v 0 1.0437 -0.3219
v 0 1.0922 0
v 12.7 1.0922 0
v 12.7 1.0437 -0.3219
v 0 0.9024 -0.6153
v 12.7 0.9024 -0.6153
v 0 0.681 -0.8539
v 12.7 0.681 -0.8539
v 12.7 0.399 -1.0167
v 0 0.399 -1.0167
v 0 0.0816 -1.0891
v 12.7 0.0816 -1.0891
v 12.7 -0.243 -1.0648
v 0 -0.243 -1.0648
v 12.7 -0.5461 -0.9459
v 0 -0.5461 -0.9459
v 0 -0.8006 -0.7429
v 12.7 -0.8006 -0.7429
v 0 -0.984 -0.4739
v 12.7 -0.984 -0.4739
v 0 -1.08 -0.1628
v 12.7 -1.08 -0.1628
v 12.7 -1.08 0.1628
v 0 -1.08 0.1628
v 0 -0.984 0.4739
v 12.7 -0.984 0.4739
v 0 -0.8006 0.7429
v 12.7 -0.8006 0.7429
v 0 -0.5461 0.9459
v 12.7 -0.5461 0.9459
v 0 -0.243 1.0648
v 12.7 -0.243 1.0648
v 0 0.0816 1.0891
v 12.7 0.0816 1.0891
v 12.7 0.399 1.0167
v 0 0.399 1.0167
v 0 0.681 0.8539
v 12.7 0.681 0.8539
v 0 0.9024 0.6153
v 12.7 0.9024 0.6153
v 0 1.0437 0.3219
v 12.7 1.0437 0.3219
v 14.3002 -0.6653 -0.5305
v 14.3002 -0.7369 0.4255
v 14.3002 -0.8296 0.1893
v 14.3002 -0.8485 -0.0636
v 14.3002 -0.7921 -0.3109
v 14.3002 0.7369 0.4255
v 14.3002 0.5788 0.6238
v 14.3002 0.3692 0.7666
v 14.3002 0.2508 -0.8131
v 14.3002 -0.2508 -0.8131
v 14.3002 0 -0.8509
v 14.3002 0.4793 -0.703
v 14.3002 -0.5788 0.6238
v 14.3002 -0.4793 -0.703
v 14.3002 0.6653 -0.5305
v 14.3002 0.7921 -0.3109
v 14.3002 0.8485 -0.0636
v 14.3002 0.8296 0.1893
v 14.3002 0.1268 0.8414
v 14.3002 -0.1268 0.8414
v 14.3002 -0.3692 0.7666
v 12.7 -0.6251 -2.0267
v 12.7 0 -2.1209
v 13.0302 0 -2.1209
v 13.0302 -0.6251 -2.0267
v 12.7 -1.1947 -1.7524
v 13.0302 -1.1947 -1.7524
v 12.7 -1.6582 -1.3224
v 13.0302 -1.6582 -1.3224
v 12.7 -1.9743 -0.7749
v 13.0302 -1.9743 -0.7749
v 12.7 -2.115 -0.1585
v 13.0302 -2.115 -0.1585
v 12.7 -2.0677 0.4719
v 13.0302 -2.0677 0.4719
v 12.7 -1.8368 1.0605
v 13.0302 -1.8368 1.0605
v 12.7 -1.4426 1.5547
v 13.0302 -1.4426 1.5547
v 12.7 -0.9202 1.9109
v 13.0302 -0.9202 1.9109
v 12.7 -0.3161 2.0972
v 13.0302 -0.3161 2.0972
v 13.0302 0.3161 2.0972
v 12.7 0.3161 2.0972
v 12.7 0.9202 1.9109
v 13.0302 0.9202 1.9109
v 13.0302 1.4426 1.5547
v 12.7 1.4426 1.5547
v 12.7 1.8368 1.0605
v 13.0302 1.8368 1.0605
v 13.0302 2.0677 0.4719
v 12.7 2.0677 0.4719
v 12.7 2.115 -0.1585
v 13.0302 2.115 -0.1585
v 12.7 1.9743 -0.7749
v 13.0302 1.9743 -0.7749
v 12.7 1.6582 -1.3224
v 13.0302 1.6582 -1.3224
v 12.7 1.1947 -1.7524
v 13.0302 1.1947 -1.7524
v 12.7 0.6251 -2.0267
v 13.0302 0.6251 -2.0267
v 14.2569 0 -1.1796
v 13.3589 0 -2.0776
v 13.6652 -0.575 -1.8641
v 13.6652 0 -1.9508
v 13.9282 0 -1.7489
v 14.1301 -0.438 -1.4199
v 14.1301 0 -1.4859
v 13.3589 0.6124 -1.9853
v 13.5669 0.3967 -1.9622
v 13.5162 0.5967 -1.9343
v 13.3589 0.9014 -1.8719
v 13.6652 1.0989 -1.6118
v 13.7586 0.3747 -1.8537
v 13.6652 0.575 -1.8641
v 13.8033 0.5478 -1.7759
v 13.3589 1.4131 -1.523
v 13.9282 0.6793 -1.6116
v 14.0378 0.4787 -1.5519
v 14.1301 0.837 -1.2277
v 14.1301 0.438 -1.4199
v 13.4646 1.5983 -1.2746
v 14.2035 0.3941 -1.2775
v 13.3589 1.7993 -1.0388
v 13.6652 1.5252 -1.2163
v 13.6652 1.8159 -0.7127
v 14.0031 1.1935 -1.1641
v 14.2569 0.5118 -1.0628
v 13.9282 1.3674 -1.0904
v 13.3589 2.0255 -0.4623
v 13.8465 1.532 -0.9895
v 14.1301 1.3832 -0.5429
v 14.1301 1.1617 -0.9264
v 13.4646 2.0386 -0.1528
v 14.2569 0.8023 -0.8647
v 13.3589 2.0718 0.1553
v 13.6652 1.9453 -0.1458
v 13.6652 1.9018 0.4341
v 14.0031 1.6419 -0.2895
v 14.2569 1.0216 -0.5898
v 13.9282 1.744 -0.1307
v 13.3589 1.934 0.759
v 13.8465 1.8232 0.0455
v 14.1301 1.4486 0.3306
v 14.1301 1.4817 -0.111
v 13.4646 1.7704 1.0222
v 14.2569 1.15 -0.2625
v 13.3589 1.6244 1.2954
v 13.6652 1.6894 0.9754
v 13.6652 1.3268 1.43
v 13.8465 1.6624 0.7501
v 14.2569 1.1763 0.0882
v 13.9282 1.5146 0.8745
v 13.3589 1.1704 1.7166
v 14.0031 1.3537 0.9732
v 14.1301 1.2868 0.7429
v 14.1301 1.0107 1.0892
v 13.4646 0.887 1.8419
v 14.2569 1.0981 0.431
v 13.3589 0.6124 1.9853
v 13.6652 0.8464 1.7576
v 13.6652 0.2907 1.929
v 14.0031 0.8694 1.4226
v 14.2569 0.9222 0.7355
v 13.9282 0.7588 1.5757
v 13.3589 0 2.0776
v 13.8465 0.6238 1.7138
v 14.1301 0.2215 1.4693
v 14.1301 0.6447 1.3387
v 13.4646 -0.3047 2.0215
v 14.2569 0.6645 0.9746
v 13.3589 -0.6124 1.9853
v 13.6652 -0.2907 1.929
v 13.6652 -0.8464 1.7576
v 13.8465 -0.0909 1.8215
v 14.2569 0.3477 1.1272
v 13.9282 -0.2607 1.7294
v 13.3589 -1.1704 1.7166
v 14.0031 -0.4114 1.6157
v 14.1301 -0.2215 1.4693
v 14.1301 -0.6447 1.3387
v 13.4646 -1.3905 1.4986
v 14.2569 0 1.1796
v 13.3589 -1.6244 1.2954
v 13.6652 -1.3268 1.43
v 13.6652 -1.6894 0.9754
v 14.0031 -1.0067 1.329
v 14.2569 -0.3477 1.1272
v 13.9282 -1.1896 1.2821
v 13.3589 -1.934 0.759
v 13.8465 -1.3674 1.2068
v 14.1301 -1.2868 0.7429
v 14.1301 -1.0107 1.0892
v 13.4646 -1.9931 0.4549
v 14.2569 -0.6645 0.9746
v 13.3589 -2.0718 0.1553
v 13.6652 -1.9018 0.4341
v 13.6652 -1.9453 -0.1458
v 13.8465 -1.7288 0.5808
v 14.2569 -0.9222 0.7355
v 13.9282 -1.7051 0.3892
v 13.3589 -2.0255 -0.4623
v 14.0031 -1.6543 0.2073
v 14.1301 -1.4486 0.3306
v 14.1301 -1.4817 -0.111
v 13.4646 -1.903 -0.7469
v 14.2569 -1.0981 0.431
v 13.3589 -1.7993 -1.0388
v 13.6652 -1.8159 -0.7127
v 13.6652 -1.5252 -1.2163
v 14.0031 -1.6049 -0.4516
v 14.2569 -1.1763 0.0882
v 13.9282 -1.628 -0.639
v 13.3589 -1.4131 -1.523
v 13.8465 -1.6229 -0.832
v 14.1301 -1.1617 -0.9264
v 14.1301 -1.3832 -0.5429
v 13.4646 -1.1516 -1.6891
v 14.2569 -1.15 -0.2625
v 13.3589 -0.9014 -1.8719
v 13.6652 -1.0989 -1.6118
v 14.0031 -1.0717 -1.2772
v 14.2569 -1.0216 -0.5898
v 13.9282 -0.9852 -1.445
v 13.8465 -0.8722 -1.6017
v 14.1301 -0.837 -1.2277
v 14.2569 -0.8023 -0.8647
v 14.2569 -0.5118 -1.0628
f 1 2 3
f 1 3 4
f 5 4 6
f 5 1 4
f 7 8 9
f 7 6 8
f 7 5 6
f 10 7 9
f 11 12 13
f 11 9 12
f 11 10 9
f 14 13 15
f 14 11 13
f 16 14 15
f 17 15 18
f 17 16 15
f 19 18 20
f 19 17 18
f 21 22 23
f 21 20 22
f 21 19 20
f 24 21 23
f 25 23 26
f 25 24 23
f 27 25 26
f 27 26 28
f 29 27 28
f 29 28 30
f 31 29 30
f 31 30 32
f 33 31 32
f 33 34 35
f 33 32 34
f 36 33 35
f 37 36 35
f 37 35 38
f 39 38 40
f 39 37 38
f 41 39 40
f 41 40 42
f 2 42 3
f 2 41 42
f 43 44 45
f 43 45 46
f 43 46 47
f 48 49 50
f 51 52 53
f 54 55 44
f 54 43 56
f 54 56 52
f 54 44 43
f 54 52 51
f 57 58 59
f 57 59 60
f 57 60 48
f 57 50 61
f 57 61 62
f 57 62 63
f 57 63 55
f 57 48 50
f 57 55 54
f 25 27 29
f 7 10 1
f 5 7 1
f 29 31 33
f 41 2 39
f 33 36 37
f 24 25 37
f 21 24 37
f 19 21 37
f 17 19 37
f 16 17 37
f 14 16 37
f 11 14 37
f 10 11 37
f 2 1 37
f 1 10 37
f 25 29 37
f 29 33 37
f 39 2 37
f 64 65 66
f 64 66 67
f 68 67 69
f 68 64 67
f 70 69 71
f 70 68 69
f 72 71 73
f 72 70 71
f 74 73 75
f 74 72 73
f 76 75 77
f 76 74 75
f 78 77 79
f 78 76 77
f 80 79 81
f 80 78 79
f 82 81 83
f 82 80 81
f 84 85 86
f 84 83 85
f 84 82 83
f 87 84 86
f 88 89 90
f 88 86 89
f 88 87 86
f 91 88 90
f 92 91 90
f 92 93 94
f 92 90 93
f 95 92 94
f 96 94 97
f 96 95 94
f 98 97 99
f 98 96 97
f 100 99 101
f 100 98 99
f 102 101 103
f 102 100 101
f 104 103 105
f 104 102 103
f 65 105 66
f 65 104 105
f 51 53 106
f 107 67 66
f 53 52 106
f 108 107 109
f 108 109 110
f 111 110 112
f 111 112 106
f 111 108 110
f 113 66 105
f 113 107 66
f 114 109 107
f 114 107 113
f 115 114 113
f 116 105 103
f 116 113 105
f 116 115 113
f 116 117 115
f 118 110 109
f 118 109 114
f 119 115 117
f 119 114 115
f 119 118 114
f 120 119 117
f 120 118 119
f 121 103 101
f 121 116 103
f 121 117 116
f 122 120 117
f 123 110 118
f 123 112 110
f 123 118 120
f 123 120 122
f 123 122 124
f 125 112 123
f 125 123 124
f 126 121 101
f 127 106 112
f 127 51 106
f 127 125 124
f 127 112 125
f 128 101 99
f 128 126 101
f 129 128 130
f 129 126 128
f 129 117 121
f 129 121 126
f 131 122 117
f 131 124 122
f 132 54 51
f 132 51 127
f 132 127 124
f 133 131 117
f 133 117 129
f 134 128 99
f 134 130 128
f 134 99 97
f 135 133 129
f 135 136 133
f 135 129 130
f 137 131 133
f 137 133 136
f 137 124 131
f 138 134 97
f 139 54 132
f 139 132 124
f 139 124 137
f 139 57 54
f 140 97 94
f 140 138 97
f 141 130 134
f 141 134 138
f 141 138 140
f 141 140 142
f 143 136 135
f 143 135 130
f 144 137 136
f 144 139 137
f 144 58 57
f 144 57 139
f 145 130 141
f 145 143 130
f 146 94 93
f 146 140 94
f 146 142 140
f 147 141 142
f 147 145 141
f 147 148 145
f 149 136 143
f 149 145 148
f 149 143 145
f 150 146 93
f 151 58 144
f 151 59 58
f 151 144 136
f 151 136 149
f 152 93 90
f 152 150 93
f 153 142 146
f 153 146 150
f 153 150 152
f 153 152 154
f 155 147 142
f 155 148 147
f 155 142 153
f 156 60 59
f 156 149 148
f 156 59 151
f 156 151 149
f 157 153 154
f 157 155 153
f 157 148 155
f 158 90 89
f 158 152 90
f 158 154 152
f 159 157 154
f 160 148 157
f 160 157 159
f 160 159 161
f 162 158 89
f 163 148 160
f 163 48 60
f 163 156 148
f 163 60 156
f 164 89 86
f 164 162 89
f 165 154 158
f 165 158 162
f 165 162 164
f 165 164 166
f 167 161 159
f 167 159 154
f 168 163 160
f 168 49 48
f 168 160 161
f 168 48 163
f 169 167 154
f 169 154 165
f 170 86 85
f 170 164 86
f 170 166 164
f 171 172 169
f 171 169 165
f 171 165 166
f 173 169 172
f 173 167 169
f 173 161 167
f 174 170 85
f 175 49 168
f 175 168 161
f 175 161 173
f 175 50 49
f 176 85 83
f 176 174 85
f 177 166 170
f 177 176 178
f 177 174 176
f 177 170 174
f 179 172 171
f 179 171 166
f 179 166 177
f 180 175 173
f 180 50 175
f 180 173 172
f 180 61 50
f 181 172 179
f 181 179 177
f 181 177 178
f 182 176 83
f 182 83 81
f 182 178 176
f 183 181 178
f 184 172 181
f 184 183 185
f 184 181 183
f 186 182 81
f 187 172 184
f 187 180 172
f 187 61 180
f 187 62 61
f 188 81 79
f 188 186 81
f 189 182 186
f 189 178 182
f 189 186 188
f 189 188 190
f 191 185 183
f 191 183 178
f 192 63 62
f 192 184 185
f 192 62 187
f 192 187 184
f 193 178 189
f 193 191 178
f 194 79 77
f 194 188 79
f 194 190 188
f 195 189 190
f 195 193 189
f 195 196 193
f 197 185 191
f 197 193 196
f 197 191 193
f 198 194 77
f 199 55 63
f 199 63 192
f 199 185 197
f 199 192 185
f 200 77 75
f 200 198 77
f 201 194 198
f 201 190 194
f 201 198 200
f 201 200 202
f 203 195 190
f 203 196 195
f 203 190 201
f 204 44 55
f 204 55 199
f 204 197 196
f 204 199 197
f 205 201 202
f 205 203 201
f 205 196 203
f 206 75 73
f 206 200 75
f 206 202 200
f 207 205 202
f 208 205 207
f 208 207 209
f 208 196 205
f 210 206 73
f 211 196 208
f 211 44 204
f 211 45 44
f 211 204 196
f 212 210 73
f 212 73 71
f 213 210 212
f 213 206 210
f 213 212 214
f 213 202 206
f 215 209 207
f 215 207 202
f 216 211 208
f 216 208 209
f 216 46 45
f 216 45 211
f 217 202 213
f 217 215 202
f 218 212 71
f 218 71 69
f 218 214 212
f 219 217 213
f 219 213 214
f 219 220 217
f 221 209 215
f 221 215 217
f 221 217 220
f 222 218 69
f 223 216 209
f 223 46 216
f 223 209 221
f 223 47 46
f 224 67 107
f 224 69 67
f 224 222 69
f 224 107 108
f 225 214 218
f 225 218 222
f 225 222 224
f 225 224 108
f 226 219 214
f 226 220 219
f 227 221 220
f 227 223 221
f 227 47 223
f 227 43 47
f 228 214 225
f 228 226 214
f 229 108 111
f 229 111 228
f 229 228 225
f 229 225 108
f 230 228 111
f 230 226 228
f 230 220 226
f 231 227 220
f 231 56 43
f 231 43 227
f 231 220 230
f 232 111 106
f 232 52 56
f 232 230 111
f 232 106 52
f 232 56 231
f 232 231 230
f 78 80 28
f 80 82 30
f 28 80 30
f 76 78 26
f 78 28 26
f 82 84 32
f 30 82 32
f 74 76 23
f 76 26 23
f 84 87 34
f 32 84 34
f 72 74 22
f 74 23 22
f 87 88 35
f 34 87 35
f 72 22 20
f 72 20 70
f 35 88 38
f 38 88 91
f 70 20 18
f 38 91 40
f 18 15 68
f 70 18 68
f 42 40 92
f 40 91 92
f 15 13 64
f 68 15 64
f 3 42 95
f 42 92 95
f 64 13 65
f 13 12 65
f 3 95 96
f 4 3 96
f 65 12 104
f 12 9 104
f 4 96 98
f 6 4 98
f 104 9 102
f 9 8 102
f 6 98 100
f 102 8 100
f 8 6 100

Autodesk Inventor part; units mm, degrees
ref_plane "YZ Plane" through (0, 0, 0) normal (1, 0, 0) x (0, 1, 0)
ref_plane "XZ Plane" through (0, 0, 0) normal (0, 1, 0) x (-1, 0, 0)
ref_plane "XY Plane" through (0, 0, 0) normal (0, 0, 1) x (1, 0, 0)
sketch "Sketch1" plane through (0, 0, 0) normal (1, 0, 0) x (0, 1, 0)
  circle A0 centre (0, 0) radius 1.0922
  dimension "d0" = 2.1844
extrude "Extrusion1" add sketch "Sketch1" along normal blind 12.7
sketch "Sketch2" plane through (12.7, 0, 0) normal (1, 0, 0) x (0, 0, -1)
  circle A0 centre (0, 0) radius 2.1209
  dimension "d3" = 4.2418
extrude "Extrusion2" add sketch "Sketch2" along normal blind 1.6002
fillet "Fillet1" radius 1.27 1 edges at (14.3002, 0, 2.1209)
thread "Thread1" size "2-56 UNC" class "2A" standard "ANSI Unified Screw Threads" full length
properties part number "2-56 screw"
